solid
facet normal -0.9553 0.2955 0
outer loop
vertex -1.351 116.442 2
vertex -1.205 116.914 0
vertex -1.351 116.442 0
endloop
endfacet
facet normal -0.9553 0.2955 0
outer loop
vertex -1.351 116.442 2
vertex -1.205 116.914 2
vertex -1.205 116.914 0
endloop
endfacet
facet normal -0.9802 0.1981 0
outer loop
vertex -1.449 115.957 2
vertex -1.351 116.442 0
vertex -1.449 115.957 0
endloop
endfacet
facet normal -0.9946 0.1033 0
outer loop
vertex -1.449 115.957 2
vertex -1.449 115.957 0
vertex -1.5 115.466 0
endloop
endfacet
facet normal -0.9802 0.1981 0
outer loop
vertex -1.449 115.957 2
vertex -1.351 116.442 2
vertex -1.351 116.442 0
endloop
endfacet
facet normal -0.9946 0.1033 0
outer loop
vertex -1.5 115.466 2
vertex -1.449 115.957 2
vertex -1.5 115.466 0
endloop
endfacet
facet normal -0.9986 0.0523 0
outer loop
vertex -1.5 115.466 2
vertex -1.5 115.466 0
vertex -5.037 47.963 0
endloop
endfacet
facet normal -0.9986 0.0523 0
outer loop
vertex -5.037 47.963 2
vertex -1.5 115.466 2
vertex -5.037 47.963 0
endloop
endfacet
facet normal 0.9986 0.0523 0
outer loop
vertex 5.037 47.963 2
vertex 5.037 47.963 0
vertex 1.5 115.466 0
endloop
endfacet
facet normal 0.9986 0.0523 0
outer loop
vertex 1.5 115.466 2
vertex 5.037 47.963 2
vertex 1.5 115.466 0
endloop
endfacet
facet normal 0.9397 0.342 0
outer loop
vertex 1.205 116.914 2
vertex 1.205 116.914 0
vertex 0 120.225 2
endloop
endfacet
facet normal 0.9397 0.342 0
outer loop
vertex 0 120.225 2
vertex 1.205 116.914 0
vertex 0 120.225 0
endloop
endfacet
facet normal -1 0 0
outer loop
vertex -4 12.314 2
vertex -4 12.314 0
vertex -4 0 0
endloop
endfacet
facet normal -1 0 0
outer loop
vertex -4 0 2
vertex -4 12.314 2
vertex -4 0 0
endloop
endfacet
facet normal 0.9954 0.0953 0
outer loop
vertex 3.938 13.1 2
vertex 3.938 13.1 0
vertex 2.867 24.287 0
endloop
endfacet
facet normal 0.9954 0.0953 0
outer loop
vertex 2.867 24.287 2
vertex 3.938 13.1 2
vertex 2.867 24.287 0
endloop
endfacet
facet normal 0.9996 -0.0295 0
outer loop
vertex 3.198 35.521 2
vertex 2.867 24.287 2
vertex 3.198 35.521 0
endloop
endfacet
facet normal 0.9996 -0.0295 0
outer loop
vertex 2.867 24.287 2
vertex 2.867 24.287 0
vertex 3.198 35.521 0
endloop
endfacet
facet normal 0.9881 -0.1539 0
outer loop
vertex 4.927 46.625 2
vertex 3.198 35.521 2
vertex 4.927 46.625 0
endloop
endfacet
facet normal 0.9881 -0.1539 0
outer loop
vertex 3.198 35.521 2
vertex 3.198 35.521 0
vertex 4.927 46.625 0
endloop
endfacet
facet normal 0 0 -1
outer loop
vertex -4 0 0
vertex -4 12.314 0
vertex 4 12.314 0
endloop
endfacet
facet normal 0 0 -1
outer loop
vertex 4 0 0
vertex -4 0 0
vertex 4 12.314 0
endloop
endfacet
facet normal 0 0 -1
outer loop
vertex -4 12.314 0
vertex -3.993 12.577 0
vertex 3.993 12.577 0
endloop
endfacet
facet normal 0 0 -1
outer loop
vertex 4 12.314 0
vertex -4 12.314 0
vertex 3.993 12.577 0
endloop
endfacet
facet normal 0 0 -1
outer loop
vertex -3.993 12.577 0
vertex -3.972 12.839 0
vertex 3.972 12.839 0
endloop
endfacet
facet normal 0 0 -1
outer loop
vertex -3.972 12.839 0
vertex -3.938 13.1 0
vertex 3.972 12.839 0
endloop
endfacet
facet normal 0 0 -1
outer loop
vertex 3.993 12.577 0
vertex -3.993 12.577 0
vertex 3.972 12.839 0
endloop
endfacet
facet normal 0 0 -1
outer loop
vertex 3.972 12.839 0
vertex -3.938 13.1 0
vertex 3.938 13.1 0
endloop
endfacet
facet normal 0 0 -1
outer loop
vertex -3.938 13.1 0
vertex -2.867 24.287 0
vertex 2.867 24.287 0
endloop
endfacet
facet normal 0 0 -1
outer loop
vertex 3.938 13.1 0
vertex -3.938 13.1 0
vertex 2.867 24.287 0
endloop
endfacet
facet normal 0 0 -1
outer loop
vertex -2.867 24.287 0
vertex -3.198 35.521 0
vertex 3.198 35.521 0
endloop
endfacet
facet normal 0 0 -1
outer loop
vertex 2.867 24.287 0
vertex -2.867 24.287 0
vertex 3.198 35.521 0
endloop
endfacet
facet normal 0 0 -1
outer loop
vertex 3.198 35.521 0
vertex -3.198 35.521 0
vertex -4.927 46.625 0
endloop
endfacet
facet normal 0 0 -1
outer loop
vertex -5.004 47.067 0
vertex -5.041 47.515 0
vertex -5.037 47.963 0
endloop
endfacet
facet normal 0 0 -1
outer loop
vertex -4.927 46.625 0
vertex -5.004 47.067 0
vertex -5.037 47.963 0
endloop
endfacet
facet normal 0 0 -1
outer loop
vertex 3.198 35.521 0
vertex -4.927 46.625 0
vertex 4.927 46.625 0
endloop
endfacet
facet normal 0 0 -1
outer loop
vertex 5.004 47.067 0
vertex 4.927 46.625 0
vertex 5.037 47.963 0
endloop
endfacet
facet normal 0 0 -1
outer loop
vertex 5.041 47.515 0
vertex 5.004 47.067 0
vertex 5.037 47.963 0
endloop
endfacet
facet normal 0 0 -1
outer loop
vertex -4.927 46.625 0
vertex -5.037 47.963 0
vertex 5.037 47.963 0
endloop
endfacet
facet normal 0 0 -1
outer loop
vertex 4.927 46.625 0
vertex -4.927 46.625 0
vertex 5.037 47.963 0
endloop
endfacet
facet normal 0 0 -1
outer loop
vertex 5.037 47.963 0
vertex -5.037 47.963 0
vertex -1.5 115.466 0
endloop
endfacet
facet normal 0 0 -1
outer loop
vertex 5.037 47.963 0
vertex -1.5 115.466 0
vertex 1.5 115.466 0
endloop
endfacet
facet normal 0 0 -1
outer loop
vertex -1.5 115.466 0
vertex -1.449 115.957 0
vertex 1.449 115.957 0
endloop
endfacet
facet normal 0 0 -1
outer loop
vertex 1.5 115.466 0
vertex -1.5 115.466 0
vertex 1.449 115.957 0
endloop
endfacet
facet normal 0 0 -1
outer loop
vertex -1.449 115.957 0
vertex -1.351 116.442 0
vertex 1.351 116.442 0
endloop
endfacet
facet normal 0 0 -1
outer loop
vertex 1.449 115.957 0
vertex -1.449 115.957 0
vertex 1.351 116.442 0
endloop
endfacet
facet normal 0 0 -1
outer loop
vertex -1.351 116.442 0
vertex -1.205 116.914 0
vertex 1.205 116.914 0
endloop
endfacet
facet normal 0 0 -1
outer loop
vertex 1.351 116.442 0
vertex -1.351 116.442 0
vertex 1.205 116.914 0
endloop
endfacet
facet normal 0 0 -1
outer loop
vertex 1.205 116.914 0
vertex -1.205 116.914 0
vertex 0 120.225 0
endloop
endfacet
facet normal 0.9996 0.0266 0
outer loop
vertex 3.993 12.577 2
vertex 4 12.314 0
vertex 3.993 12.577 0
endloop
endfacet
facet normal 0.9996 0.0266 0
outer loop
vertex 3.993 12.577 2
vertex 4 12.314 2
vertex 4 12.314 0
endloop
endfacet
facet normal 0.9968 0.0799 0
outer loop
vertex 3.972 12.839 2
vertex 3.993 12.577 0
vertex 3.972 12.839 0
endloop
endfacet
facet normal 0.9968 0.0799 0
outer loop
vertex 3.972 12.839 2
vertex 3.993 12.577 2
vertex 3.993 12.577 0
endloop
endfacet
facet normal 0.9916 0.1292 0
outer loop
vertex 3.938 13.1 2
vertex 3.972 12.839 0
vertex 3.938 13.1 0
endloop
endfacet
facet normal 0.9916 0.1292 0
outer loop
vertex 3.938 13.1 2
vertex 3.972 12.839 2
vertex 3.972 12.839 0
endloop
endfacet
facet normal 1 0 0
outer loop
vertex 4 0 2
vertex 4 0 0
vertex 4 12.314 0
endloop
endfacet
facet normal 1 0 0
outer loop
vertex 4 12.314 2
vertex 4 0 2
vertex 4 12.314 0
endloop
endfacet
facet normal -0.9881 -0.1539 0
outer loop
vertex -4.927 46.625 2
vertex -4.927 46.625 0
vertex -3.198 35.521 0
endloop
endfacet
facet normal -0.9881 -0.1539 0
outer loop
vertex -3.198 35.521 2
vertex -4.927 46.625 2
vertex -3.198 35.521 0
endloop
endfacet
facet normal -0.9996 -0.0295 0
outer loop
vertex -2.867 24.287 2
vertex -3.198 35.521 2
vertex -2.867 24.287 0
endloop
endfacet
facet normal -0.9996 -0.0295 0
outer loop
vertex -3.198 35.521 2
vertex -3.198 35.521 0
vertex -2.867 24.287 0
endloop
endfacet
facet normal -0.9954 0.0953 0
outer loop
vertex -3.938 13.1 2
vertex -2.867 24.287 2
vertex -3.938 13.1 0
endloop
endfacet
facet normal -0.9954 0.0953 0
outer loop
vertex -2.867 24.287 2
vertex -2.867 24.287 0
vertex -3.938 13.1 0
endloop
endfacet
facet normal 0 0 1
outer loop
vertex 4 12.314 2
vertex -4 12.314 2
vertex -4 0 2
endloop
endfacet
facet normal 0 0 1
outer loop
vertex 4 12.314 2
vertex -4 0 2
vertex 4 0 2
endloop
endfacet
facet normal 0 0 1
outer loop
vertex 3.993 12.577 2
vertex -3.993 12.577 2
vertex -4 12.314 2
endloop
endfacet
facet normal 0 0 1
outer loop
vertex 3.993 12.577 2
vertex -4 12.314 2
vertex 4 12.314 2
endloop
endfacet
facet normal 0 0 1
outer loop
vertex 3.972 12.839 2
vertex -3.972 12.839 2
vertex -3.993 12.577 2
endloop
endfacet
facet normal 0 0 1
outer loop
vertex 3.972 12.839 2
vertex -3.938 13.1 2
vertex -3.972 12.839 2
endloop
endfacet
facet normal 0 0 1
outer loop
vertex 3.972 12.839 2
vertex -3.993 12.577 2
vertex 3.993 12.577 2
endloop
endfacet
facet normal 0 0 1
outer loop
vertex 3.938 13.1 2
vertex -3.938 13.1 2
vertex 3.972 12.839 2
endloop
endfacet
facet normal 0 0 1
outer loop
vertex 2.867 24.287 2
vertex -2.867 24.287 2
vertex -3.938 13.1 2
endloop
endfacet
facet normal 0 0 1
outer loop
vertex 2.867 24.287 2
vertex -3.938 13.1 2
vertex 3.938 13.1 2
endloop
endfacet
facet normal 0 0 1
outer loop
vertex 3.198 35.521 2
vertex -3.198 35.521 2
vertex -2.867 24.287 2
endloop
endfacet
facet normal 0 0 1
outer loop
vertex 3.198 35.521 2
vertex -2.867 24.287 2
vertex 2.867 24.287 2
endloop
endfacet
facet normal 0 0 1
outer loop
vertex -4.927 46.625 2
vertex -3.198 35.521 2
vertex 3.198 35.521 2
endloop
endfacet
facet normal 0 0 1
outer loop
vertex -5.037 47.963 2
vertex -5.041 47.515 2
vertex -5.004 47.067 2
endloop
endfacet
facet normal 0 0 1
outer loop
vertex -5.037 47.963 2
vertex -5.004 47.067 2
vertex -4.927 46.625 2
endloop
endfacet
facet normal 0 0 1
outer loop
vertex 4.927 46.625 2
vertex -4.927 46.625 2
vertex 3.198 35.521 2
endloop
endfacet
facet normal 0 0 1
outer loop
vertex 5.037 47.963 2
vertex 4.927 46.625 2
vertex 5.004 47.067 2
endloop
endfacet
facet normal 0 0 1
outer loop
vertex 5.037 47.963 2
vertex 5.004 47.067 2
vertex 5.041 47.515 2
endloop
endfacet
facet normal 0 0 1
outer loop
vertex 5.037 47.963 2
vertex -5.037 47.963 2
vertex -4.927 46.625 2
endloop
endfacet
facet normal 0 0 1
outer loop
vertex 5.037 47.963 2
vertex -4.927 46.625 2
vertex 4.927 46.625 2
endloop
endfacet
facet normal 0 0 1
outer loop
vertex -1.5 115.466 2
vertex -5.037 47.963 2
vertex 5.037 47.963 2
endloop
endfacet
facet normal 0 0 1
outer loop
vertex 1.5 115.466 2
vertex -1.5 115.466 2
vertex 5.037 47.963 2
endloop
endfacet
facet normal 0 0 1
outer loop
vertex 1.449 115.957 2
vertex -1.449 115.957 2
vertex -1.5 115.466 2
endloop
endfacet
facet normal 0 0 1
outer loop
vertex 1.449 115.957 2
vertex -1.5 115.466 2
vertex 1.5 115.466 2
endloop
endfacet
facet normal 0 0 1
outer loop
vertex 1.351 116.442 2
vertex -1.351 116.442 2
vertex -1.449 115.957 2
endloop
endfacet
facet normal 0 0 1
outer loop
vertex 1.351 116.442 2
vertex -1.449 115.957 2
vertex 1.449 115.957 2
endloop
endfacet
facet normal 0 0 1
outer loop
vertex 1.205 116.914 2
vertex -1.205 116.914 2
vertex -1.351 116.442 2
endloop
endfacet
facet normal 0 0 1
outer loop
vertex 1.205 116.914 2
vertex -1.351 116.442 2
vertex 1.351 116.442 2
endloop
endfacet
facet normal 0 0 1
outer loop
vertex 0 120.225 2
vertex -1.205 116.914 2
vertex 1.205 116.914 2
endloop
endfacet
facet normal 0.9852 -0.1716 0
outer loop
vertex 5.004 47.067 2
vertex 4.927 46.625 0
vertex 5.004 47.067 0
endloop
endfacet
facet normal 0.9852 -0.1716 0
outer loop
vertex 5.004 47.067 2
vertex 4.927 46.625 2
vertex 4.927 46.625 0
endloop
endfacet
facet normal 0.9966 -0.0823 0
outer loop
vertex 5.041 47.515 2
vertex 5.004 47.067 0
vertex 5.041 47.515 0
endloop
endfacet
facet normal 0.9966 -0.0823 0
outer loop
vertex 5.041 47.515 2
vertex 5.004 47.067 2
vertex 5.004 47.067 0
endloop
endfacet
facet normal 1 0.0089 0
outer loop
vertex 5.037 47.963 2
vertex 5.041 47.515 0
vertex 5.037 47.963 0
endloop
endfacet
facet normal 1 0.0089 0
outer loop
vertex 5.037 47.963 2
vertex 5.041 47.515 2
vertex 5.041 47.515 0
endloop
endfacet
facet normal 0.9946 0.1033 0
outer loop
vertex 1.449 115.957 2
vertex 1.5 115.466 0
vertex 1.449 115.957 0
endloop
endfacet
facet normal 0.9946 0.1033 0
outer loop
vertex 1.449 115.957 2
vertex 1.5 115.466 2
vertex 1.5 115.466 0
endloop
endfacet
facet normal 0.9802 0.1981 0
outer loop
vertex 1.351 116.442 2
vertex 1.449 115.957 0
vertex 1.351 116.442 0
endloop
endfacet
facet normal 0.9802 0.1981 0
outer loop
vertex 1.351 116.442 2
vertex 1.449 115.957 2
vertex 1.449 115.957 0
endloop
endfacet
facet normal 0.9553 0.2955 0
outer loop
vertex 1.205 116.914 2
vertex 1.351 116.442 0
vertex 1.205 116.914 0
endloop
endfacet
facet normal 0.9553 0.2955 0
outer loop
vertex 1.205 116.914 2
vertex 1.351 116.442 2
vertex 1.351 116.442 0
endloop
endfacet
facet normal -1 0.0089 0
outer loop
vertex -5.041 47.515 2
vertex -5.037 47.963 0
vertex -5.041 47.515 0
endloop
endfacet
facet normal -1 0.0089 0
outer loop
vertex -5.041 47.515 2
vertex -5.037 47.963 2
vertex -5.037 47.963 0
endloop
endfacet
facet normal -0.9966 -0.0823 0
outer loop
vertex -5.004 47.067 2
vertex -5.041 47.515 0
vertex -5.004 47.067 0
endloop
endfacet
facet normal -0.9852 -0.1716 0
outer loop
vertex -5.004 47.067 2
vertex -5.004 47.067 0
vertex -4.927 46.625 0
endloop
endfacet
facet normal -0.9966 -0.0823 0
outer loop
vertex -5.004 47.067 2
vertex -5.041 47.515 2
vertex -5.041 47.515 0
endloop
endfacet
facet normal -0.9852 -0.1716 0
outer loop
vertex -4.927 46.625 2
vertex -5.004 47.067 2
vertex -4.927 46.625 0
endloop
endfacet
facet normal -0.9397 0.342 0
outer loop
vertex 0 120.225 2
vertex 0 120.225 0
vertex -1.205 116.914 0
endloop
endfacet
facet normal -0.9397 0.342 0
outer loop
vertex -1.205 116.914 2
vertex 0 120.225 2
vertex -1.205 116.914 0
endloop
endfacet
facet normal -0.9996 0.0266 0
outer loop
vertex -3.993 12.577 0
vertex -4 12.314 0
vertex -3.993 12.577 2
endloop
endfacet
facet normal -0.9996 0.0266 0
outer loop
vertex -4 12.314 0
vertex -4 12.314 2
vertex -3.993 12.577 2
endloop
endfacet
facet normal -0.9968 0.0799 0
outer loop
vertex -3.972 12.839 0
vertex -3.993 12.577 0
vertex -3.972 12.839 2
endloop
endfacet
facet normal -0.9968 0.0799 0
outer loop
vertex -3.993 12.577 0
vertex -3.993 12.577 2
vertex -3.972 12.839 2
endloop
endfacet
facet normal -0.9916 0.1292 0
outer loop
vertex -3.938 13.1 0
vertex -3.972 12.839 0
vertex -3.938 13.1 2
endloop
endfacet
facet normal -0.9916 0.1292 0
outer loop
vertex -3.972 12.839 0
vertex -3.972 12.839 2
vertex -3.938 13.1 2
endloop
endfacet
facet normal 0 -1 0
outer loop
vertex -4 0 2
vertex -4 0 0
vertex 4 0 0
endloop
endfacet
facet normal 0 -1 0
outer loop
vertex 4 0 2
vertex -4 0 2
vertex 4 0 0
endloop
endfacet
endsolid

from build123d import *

# Parameters (mm, degrees)
F1_DEPTH = 2
F2_R     = 5


with BuildPart() as f1:
    # F0 (on Top) → F1 (new body)
    with BuildSketch(Plane.XY):
        with BuildLine():
            Line((-4, 12.71492), (-4, 0))
            Line((-4, 0), (0, 0))
            Line((0, 0), (4, 0))
            Line((4, 0), (4, 12.71492))
            ThreePointArc((4, 12.71492), (2.861128, 30.04824), (5.073318, 47.277495))
            Line((5.073318, 47.277495), (1.460623, 116.211824))
            Line((1.460623, 116.211824), (0, 120.224852))
            Line((0, 120.224852), (-1.460623, 116.211824))
            Line((-1.460623, 116.211824), (-5.073318, 47.277495))
            ThreePointArc((-5.073318, 47.277495), (-2.861128, 30.04824), (-4, 12.71492))
        make_face()
    extrude(amount=F1_DEPTH)

    # F2
    f2_edges = [f1.edges().sort_by_distance(p)[0] for p in [
        (-1.460623, 116.211824, 1),
        (1.460623, 116.211824, 1),
        (5.073318, 47.277495, 1),
        (-5.073318, 47.277495, 1),
        (-4, 12.71492, 1),
        (4, 12.71492, 1),
    ]]
    fillet(f2_edges, radius=F2_R)


solid = f1.part
